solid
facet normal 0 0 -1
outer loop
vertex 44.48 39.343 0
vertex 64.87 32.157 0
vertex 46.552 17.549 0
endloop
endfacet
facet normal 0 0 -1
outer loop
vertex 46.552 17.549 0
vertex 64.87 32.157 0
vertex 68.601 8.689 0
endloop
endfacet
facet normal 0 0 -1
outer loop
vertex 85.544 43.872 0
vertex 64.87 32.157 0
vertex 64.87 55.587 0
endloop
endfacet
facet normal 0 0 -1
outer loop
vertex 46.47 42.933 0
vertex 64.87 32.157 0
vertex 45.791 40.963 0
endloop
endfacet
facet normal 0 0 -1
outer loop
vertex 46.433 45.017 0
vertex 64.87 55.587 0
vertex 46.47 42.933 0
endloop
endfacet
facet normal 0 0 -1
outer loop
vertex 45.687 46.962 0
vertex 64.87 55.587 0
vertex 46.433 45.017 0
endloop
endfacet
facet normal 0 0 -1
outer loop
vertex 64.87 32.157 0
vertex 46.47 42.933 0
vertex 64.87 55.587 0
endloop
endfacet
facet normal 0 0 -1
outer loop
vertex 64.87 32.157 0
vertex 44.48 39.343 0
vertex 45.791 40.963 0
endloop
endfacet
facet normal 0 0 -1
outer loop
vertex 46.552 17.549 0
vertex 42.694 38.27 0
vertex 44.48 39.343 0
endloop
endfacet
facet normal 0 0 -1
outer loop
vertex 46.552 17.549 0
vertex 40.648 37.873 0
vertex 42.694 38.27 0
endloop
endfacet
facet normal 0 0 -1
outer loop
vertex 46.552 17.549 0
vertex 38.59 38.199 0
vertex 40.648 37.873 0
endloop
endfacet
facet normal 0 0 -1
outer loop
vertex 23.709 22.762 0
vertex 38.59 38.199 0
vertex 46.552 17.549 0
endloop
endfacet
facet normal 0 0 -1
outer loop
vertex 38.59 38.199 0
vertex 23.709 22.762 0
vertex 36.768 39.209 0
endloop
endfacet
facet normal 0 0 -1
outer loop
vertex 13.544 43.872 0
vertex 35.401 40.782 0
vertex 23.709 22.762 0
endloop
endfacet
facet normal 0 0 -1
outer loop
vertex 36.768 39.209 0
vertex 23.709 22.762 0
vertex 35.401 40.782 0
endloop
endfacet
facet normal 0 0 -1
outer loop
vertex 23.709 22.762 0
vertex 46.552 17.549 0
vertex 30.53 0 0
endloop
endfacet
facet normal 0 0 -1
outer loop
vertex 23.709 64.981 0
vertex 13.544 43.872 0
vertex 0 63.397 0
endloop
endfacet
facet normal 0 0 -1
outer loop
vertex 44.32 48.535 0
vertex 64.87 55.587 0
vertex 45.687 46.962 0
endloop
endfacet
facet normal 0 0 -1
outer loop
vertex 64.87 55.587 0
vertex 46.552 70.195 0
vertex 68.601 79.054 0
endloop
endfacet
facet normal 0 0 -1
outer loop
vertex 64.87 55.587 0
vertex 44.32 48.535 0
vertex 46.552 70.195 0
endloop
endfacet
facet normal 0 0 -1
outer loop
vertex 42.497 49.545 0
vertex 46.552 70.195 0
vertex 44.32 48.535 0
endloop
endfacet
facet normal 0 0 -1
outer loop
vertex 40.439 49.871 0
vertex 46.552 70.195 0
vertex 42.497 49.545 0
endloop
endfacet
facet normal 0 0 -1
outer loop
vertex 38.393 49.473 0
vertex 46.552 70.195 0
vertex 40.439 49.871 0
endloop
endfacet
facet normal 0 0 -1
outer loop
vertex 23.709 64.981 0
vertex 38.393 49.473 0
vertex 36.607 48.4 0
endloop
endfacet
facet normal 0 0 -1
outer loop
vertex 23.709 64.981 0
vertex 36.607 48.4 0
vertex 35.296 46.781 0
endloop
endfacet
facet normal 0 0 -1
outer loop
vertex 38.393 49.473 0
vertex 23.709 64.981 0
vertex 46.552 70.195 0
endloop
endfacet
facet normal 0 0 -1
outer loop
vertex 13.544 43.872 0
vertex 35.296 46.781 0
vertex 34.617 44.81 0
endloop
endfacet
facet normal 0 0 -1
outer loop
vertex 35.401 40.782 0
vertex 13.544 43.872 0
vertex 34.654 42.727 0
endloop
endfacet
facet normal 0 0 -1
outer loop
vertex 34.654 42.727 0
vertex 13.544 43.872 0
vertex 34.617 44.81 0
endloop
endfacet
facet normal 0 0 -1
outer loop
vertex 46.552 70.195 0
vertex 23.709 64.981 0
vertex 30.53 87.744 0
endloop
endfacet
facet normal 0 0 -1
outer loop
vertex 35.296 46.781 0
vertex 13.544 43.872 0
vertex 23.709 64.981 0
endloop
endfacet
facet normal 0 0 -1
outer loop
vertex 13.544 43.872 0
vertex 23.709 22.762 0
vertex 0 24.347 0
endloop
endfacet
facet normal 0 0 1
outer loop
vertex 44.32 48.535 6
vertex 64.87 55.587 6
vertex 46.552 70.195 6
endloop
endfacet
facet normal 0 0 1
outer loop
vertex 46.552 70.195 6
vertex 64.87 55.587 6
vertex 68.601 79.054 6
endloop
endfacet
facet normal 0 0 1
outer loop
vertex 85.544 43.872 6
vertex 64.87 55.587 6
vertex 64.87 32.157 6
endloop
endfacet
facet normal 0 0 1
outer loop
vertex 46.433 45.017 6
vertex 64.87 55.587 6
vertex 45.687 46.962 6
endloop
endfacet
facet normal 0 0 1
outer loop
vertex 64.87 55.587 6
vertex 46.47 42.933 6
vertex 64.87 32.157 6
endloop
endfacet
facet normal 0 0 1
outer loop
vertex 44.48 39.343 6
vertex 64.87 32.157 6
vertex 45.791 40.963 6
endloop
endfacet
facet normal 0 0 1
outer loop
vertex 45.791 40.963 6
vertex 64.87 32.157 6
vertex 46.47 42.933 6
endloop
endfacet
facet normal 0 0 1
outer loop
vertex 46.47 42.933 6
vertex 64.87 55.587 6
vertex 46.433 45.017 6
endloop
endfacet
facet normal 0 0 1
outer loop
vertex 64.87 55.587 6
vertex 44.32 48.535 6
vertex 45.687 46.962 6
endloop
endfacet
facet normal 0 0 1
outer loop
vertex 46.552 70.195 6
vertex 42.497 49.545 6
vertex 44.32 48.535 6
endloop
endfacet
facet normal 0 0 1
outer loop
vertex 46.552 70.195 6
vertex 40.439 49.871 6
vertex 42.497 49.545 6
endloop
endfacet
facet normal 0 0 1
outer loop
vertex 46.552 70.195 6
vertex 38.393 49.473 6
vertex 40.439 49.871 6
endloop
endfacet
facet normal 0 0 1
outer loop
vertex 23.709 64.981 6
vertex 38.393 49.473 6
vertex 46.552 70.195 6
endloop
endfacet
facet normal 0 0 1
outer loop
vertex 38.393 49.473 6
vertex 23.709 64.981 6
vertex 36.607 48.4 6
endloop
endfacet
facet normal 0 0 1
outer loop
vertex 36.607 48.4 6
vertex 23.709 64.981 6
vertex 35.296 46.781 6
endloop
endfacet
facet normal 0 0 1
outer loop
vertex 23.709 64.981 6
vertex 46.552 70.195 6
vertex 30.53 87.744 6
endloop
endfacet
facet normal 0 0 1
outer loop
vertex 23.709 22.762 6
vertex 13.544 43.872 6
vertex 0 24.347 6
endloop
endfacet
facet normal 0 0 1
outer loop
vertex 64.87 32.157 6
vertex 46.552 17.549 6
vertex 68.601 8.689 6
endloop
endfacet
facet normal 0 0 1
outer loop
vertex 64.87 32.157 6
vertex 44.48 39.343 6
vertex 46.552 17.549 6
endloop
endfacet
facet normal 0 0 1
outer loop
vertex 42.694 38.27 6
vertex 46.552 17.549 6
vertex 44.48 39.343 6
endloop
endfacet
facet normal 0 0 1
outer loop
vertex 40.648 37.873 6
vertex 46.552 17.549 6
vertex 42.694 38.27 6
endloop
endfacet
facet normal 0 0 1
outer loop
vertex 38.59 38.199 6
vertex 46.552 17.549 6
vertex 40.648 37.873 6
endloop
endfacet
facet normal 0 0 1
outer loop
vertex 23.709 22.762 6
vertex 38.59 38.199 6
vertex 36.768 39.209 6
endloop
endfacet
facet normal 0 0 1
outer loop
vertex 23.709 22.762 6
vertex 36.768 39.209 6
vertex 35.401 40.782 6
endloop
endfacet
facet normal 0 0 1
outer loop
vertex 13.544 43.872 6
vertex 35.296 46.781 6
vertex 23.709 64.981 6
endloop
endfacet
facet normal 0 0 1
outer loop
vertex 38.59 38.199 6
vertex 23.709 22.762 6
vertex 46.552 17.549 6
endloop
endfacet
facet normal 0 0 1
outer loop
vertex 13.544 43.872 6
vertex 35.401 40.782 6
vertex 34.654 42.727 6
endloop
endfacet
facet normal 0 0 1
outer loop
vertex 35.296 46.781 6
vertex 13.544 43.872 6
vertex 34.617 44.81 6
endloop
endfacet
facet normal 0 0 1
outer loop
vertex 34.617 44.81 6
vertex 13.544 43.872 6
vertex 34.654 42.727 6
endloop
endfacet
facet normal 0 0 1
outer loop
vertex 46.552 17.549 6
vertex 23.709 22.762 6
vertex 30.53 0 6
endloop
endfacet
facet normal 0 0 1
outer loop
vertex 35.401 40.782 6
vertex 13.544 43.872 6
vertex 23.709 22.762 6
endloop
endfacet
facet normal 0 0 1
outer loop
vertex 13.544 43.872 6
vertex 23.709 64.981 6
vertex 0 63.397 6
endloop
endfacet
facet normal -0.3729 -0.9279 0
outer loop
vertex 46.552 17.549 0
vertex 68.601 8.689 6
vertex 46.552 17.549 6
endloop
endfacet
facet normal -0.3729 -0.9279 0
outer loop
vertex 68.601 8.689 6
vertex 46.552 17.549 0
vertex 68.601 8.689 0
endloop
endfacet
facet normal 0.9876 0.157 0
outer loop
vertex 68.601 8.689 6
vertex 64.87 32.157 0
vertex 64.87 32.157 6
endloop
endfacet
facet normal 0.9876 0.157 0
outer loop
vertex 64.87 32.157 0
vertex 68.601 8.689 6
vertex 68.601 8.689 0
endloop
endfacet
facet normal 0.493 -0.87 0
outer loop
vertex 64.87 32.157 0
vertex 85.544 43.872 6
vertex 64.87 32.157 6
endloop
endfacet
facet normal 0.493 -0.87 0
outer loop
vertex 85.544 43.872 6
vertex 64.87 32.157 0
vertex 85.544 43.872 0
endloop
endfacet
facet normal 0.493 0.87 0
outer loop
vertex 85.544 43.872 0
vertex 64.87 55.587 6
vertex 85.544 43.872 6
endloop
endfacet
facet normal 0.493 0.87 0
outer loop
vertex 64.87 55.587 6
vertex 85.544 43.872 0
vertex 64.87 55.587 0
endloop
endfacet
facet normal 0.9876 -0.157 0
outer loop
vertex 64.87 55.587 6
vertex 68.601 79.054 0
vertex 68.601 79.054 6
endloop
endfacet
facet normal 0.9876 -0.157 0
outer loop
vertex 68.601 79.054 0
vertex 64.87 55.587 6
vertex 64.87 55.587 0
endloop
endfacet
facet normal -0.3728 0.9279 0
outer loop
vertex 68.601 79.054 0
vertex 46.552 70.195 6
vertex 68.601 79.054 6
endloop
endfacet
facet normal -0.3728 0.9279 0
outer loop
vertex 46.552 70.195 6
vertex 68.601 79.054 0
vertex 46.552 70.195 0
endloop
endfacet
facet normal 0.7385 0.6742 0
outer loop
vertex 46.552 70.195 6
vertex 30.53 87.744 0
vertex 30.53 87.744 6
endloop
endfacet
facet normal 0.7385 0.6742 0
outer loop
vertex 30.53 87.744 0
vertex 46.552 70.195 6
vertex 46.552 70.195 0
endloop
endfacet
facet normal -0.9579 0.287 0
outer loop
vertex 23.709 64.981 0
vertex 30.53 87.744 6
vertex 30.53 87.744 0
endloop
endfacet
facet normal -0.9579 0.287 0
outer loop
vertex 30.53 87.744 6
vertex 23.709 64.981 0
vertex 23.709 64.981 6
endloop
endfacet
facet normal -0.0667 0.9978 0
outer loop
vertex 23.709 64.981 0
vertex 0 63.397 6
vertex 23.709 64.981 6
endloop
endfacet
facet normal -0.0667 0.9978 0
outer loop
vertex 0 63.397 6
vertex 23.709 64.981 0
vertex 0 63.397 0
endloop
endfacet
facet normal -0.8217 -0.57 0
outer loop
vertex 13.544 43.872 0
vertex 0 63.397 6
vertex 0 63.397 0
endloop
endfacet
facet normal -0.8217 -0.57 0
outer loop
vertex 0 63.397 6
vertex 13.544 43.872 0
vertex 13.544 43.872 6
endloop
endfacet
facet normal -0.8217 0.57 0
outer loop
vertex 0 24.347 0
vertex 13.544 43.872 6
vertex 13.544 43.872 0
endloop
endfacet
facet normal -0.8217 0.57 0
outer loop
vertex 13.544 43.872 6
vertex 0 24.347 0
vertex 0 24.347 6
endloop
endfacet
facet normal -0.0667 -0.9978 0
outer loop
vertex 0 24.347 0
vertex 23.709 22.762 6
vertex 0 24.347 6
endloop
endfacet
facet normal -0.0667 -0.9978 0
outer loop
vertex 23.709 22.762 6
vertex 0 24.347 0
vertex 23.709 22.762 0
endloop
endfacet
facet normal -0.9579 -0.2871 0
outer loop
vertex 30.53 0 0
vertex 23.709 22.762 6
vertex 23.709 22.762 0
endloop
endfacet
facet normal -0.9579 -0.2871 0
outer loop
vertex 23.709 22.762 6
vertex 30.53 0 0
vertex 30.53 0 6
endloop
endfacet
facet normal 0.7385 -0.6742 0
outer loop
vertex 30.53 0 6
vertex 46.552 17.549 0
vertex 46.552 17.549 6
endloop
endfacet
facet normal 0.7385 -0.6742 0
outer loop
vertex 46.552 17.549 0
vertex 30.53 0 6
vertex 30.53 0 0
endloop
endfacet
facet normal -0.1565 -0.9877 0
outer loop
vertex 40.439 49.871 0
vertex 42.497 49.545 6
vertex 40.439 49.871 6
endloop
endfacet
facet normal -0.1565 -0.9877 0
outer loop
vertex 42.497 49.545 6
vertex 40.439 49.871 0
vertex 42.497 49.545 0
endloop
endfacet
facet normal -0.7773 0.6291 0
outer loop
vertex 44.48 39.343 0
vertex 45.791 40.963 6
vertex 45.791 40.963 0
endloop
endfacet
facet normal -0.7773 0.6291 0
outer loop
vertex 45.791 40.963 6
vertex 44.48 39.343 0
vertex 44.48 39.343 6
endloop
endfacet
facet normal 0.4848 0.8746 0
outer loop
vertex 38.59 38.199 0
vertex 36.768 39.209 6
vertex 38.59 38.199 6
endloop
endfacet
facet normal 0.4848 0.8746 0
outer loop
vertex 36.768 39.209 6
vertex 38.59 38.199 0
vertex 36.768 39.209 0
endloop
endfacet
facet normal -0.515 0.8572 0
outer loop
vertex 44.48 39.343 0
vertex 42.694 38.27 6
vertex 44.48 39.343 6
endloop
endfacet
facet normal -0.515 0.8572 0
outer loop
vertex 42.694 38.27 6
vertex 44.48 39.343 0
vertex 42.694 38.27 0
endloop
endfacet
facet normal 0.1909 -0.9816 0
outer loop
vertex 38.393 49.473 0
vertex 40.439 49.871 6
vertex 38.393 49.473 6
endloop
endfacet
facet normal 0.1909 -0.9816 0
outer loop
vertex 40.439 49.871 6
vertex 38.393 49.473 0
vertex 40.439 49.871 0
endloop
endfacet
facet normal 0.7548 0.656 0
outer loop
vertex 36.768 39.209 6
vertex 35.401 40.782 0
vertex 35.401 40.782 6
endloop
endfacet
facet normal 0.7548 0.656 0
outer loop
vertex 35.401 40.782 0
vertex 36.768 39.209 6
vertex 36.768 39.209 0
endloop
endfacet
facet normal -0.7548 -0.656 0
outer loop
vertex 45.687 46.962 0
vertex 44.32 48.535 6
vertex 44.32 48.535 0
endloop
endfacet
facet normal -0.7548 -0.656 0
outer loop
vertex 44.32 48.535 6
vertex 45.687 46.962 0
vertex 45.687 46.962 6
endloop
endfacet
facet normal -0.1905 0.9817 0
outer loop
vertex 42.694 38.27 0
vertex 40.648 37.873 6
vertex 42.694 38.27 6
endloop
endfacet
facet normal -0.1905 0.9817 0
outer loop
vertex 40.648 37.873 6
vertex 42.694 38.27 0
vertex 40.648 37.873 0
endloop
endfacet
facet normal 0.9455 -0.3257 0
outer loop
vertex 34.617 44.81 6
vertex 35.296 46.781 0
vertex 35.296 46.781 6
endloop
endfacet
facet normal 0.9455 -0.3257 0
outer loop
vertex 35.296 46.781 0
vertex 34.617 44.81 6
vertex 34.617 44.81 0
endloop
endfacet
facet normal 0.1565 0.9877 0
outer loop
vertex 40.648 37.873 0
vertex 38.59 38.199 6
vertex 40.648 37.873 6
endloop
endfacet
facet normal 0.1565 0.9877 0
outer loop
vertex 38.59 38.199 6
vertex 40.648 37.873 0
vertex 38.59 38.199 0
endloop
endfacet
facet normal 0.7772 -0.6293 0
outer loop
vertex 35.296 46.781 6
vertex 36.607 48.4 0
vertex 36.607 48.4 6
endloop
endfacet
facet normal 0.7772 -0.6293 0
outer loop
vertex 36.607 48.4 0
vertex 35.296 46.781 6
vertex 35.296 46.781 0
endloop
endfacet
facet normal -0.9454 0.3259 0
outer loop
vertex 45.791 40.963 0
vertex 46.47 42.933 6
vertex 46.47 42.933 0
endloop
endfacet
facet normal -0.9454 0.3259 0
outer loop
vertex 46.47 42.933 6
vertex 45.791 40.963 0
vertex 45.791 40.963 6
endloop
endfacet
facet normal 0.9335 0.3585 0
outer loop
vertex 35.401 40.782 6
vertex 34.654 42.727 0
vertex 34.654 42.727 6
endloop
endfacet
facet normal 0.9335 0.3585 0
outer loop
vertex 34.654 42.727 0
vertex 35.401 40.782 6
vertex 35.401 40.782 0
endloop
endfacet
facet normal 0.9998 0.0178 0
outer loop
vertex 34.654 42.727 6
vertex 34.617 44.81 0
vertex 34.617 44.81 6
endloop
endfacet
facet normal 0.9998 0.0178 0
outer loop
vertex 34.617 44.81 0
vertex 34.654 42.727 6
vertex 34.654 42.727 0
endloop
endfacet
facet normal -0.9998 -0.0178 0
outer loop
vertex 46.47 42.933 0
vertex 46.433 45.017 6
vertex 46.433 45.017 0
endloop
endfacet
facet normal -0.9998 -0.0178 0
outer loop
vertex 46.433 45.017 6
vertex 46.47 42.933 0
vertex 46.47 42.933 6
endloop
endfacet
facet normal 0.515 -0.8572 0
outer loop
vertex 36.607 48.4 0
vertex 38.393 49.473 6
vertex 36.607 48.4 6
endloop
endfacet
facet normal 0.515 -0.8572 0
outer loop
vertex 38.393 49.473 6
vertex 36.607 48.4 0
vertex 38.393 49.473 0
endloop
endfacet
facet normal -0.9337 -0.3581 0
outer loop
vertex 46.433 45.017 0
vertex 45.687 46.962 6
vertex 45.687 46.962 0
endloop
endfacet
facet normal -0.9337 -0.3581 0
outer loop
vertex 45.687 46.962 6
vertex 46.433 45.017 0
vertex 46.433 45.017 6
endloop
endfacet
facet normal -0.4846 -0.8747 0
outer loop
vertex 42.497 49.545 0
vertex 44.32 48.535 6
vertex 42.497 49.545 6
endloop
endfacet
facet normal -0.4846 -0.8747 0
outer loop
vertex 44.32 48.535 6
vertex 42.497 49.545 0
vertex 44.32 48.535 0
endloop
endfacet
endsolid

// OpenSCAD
$fn = 32;

// ----------------------------------------------------------------------
// Star wheel: 7-point star, R45
// ----------------------------------------------------------------------

// --- parameters (mm) ---
n_points = 7;             // number of points / teeth
r_out = 45;               // tip radius
r_in = 27;                // root radius
bore_r = 6;               // centre bore radius
plate_t = 6;              // plate thickness, Z (extrusion height)
bore_d = 12;              // centre bore diameter
fit_tol = 0.05;           // declared fit tolerance (prompt contract)
free_tol = 0.2;           // declared free tolerance (prompt contract)

profile = [[85.544, 43.872], [64.87, 55.587], [68.601, 79.054], [46.552, 70.195], [30.53, 87.744], [23.709, 64.981], [0, 63.397], [13.544, 43.872], [0, 24.347], [23.709, 22.762], [30.53, 0], [46.552, 17.549], [68.601, 8.689], [64.87, 32.157]];  // primary outline, 14 points, counter clockwise
void_1 = [[46.433, 45.017], [45.687, 46.962], [44.32, 48.535], [42.497, 49.545], [40.439, 49.871], [38.393, 49.473], [36.607, 48.4], [35.296, 46.781], [34.617, 44.81], [34.654, 42.727], [35.401, 40.782], [36.768, 39.209], [38.59, 38.199], [40.648, 37.873], [42.694, 38.27], [44.48, 39.343], [45.791, 40.963], [46.47, 42.933]];  // centre bore, 18 points

// --- the one profile operation ---
difference() {
  linear_extrude(height = plate_t) polygon(points = profile);
  translate([0, 0, -1])
    linear_extrude(height = plate_t + 2) polygon(points = void_1);
}
